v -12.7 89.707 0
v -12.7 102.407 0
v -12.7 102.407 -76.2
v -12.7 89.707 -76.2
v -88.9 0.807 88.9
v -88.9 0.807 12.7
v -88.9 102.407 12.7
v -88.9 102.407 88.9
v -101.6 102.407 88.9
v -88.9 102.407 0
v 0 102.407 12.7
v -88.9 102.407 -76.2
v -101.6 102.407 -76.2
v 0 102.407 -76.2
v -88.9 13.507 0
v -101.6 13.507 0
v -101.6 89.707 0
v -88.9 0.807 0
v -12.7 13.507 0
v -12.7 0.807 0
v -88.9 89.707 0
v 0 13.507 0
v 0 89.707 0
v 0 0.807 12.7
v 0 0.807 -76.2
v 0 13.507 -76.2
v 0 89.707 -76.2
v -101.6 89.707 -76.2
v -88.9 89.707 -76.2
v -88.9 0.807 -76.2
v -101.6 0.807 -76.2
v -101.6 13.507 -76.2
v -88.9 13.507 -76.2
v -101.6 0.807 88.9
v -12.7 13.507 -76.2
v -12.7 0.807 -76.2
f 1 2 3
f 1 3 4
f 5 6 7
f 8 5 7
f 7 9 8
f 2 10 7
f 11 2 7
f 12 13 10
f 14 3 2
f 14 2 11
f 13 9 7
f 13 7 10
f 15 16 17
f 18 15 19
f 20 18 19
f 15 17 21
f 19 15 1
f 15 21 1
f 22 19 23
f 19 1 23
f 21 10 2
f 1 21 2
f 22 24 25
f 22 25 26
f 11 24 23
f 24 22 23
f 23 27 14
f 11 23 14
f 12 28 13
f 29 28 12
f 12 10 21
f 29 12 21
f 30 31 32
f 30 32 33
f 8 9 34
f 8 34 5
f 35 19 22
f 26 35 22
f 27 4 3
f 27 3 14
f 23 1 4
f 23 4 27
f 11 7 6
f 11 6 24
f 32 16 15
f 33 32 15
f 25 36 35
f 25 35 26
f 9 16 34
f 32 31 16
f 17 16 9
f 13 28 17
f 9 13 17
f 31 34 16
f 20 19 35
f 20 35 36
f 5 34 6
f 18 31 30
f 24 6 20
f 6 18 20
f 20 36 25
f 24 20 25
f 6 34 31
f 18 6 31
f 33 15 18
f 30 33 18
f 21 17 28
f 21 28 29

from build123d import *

# Parameters (mm, degrees)
F0_W     = 101.6
F0_H     = 101.6
F1_DEPTH = 12.7
F2_W     = 12.7
F2_H     = 12.7
F3_DEPTH = 76.2
F4_W     = 12.7
F4_H     = 101.6
F5_DEPTH = 76.2


with BuildPart() as f1:
    # F0 (on Top) → F1 (new body)
    with BuildSketch(Plane.XY):
        with Locations((-50.8, 51.606577)):
            Rectangle(F0_W, F0_H)
    extrude(amount=F1_DEPTH)

    # F2 (on face) → F3 (join)
    with BuildSketch(Plane(origin=(0, 0, 0), x_dir=(1, 0, 0), z_dir=(0, 0, -1))):
        with Locations((-95.25, -7.156577)):
            Rectangle(F2_W, F2_H)
        with Locations((-6.35, -7.156577)):
            Rectangle(F2_W, F2_H)
        with Locations((-6.35, -96.056577)):
            Rectangle(F2_W, F2_H)
        with Locations((-95.25, -96.056577)):
            Rectangle(F2_W, F2_H)
    extrude(amount=F3_DEPTH)

    # F4 (on face) → F5 (join)
    with BuildSketch(Plane.XY.offset(12.7)):
        with Locations((-95.25, 51.606577)):
            Rectangle(F4_W, F4_H)
    extrude(amount=F5_DEPTH)


solid = f1.part
